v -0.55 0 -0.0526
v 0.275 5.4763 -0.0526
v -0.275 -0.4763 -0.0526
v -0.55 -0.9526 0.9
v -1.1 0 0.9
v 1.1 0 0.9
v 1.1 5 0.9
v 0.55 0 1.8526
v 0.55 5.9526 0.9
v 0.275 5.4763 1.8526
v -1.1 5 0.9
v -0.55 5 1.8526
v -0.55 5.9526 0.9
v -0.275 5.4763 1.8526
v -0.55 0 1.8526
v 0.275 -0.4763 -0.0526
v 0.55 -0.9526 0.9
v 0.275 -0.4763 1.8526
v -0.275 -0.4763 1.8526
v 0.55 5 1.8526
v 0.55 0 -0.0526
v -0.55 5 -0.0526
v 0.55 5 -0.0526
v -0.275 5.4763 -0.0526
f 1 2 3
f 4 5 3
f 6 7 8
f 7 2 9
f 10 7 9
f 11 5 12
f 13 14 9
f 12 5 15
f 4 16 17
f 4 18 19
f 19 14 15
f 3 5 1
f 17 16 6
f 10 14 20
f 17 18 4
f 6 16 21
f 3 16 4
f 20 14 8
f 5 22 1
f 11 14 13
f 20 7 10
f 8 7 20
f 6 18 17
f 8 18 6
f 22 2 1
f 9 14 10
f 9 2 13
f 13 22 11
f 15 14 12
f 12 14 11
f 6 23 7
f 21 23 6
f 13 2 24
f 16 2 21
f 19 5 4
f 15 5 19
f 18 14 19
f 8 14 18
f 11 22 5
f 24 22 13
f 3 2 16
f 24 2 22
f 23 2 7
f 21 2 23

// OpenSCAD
module rod(a, b, r) {
        hull() {
            translate(a) sphere(r,$fn=6);
            translate(b) sphere(r,$fn=6);
        }
    }
translate([0,0,.9])
rod([0,0,0],[0,5,0],1.1);
